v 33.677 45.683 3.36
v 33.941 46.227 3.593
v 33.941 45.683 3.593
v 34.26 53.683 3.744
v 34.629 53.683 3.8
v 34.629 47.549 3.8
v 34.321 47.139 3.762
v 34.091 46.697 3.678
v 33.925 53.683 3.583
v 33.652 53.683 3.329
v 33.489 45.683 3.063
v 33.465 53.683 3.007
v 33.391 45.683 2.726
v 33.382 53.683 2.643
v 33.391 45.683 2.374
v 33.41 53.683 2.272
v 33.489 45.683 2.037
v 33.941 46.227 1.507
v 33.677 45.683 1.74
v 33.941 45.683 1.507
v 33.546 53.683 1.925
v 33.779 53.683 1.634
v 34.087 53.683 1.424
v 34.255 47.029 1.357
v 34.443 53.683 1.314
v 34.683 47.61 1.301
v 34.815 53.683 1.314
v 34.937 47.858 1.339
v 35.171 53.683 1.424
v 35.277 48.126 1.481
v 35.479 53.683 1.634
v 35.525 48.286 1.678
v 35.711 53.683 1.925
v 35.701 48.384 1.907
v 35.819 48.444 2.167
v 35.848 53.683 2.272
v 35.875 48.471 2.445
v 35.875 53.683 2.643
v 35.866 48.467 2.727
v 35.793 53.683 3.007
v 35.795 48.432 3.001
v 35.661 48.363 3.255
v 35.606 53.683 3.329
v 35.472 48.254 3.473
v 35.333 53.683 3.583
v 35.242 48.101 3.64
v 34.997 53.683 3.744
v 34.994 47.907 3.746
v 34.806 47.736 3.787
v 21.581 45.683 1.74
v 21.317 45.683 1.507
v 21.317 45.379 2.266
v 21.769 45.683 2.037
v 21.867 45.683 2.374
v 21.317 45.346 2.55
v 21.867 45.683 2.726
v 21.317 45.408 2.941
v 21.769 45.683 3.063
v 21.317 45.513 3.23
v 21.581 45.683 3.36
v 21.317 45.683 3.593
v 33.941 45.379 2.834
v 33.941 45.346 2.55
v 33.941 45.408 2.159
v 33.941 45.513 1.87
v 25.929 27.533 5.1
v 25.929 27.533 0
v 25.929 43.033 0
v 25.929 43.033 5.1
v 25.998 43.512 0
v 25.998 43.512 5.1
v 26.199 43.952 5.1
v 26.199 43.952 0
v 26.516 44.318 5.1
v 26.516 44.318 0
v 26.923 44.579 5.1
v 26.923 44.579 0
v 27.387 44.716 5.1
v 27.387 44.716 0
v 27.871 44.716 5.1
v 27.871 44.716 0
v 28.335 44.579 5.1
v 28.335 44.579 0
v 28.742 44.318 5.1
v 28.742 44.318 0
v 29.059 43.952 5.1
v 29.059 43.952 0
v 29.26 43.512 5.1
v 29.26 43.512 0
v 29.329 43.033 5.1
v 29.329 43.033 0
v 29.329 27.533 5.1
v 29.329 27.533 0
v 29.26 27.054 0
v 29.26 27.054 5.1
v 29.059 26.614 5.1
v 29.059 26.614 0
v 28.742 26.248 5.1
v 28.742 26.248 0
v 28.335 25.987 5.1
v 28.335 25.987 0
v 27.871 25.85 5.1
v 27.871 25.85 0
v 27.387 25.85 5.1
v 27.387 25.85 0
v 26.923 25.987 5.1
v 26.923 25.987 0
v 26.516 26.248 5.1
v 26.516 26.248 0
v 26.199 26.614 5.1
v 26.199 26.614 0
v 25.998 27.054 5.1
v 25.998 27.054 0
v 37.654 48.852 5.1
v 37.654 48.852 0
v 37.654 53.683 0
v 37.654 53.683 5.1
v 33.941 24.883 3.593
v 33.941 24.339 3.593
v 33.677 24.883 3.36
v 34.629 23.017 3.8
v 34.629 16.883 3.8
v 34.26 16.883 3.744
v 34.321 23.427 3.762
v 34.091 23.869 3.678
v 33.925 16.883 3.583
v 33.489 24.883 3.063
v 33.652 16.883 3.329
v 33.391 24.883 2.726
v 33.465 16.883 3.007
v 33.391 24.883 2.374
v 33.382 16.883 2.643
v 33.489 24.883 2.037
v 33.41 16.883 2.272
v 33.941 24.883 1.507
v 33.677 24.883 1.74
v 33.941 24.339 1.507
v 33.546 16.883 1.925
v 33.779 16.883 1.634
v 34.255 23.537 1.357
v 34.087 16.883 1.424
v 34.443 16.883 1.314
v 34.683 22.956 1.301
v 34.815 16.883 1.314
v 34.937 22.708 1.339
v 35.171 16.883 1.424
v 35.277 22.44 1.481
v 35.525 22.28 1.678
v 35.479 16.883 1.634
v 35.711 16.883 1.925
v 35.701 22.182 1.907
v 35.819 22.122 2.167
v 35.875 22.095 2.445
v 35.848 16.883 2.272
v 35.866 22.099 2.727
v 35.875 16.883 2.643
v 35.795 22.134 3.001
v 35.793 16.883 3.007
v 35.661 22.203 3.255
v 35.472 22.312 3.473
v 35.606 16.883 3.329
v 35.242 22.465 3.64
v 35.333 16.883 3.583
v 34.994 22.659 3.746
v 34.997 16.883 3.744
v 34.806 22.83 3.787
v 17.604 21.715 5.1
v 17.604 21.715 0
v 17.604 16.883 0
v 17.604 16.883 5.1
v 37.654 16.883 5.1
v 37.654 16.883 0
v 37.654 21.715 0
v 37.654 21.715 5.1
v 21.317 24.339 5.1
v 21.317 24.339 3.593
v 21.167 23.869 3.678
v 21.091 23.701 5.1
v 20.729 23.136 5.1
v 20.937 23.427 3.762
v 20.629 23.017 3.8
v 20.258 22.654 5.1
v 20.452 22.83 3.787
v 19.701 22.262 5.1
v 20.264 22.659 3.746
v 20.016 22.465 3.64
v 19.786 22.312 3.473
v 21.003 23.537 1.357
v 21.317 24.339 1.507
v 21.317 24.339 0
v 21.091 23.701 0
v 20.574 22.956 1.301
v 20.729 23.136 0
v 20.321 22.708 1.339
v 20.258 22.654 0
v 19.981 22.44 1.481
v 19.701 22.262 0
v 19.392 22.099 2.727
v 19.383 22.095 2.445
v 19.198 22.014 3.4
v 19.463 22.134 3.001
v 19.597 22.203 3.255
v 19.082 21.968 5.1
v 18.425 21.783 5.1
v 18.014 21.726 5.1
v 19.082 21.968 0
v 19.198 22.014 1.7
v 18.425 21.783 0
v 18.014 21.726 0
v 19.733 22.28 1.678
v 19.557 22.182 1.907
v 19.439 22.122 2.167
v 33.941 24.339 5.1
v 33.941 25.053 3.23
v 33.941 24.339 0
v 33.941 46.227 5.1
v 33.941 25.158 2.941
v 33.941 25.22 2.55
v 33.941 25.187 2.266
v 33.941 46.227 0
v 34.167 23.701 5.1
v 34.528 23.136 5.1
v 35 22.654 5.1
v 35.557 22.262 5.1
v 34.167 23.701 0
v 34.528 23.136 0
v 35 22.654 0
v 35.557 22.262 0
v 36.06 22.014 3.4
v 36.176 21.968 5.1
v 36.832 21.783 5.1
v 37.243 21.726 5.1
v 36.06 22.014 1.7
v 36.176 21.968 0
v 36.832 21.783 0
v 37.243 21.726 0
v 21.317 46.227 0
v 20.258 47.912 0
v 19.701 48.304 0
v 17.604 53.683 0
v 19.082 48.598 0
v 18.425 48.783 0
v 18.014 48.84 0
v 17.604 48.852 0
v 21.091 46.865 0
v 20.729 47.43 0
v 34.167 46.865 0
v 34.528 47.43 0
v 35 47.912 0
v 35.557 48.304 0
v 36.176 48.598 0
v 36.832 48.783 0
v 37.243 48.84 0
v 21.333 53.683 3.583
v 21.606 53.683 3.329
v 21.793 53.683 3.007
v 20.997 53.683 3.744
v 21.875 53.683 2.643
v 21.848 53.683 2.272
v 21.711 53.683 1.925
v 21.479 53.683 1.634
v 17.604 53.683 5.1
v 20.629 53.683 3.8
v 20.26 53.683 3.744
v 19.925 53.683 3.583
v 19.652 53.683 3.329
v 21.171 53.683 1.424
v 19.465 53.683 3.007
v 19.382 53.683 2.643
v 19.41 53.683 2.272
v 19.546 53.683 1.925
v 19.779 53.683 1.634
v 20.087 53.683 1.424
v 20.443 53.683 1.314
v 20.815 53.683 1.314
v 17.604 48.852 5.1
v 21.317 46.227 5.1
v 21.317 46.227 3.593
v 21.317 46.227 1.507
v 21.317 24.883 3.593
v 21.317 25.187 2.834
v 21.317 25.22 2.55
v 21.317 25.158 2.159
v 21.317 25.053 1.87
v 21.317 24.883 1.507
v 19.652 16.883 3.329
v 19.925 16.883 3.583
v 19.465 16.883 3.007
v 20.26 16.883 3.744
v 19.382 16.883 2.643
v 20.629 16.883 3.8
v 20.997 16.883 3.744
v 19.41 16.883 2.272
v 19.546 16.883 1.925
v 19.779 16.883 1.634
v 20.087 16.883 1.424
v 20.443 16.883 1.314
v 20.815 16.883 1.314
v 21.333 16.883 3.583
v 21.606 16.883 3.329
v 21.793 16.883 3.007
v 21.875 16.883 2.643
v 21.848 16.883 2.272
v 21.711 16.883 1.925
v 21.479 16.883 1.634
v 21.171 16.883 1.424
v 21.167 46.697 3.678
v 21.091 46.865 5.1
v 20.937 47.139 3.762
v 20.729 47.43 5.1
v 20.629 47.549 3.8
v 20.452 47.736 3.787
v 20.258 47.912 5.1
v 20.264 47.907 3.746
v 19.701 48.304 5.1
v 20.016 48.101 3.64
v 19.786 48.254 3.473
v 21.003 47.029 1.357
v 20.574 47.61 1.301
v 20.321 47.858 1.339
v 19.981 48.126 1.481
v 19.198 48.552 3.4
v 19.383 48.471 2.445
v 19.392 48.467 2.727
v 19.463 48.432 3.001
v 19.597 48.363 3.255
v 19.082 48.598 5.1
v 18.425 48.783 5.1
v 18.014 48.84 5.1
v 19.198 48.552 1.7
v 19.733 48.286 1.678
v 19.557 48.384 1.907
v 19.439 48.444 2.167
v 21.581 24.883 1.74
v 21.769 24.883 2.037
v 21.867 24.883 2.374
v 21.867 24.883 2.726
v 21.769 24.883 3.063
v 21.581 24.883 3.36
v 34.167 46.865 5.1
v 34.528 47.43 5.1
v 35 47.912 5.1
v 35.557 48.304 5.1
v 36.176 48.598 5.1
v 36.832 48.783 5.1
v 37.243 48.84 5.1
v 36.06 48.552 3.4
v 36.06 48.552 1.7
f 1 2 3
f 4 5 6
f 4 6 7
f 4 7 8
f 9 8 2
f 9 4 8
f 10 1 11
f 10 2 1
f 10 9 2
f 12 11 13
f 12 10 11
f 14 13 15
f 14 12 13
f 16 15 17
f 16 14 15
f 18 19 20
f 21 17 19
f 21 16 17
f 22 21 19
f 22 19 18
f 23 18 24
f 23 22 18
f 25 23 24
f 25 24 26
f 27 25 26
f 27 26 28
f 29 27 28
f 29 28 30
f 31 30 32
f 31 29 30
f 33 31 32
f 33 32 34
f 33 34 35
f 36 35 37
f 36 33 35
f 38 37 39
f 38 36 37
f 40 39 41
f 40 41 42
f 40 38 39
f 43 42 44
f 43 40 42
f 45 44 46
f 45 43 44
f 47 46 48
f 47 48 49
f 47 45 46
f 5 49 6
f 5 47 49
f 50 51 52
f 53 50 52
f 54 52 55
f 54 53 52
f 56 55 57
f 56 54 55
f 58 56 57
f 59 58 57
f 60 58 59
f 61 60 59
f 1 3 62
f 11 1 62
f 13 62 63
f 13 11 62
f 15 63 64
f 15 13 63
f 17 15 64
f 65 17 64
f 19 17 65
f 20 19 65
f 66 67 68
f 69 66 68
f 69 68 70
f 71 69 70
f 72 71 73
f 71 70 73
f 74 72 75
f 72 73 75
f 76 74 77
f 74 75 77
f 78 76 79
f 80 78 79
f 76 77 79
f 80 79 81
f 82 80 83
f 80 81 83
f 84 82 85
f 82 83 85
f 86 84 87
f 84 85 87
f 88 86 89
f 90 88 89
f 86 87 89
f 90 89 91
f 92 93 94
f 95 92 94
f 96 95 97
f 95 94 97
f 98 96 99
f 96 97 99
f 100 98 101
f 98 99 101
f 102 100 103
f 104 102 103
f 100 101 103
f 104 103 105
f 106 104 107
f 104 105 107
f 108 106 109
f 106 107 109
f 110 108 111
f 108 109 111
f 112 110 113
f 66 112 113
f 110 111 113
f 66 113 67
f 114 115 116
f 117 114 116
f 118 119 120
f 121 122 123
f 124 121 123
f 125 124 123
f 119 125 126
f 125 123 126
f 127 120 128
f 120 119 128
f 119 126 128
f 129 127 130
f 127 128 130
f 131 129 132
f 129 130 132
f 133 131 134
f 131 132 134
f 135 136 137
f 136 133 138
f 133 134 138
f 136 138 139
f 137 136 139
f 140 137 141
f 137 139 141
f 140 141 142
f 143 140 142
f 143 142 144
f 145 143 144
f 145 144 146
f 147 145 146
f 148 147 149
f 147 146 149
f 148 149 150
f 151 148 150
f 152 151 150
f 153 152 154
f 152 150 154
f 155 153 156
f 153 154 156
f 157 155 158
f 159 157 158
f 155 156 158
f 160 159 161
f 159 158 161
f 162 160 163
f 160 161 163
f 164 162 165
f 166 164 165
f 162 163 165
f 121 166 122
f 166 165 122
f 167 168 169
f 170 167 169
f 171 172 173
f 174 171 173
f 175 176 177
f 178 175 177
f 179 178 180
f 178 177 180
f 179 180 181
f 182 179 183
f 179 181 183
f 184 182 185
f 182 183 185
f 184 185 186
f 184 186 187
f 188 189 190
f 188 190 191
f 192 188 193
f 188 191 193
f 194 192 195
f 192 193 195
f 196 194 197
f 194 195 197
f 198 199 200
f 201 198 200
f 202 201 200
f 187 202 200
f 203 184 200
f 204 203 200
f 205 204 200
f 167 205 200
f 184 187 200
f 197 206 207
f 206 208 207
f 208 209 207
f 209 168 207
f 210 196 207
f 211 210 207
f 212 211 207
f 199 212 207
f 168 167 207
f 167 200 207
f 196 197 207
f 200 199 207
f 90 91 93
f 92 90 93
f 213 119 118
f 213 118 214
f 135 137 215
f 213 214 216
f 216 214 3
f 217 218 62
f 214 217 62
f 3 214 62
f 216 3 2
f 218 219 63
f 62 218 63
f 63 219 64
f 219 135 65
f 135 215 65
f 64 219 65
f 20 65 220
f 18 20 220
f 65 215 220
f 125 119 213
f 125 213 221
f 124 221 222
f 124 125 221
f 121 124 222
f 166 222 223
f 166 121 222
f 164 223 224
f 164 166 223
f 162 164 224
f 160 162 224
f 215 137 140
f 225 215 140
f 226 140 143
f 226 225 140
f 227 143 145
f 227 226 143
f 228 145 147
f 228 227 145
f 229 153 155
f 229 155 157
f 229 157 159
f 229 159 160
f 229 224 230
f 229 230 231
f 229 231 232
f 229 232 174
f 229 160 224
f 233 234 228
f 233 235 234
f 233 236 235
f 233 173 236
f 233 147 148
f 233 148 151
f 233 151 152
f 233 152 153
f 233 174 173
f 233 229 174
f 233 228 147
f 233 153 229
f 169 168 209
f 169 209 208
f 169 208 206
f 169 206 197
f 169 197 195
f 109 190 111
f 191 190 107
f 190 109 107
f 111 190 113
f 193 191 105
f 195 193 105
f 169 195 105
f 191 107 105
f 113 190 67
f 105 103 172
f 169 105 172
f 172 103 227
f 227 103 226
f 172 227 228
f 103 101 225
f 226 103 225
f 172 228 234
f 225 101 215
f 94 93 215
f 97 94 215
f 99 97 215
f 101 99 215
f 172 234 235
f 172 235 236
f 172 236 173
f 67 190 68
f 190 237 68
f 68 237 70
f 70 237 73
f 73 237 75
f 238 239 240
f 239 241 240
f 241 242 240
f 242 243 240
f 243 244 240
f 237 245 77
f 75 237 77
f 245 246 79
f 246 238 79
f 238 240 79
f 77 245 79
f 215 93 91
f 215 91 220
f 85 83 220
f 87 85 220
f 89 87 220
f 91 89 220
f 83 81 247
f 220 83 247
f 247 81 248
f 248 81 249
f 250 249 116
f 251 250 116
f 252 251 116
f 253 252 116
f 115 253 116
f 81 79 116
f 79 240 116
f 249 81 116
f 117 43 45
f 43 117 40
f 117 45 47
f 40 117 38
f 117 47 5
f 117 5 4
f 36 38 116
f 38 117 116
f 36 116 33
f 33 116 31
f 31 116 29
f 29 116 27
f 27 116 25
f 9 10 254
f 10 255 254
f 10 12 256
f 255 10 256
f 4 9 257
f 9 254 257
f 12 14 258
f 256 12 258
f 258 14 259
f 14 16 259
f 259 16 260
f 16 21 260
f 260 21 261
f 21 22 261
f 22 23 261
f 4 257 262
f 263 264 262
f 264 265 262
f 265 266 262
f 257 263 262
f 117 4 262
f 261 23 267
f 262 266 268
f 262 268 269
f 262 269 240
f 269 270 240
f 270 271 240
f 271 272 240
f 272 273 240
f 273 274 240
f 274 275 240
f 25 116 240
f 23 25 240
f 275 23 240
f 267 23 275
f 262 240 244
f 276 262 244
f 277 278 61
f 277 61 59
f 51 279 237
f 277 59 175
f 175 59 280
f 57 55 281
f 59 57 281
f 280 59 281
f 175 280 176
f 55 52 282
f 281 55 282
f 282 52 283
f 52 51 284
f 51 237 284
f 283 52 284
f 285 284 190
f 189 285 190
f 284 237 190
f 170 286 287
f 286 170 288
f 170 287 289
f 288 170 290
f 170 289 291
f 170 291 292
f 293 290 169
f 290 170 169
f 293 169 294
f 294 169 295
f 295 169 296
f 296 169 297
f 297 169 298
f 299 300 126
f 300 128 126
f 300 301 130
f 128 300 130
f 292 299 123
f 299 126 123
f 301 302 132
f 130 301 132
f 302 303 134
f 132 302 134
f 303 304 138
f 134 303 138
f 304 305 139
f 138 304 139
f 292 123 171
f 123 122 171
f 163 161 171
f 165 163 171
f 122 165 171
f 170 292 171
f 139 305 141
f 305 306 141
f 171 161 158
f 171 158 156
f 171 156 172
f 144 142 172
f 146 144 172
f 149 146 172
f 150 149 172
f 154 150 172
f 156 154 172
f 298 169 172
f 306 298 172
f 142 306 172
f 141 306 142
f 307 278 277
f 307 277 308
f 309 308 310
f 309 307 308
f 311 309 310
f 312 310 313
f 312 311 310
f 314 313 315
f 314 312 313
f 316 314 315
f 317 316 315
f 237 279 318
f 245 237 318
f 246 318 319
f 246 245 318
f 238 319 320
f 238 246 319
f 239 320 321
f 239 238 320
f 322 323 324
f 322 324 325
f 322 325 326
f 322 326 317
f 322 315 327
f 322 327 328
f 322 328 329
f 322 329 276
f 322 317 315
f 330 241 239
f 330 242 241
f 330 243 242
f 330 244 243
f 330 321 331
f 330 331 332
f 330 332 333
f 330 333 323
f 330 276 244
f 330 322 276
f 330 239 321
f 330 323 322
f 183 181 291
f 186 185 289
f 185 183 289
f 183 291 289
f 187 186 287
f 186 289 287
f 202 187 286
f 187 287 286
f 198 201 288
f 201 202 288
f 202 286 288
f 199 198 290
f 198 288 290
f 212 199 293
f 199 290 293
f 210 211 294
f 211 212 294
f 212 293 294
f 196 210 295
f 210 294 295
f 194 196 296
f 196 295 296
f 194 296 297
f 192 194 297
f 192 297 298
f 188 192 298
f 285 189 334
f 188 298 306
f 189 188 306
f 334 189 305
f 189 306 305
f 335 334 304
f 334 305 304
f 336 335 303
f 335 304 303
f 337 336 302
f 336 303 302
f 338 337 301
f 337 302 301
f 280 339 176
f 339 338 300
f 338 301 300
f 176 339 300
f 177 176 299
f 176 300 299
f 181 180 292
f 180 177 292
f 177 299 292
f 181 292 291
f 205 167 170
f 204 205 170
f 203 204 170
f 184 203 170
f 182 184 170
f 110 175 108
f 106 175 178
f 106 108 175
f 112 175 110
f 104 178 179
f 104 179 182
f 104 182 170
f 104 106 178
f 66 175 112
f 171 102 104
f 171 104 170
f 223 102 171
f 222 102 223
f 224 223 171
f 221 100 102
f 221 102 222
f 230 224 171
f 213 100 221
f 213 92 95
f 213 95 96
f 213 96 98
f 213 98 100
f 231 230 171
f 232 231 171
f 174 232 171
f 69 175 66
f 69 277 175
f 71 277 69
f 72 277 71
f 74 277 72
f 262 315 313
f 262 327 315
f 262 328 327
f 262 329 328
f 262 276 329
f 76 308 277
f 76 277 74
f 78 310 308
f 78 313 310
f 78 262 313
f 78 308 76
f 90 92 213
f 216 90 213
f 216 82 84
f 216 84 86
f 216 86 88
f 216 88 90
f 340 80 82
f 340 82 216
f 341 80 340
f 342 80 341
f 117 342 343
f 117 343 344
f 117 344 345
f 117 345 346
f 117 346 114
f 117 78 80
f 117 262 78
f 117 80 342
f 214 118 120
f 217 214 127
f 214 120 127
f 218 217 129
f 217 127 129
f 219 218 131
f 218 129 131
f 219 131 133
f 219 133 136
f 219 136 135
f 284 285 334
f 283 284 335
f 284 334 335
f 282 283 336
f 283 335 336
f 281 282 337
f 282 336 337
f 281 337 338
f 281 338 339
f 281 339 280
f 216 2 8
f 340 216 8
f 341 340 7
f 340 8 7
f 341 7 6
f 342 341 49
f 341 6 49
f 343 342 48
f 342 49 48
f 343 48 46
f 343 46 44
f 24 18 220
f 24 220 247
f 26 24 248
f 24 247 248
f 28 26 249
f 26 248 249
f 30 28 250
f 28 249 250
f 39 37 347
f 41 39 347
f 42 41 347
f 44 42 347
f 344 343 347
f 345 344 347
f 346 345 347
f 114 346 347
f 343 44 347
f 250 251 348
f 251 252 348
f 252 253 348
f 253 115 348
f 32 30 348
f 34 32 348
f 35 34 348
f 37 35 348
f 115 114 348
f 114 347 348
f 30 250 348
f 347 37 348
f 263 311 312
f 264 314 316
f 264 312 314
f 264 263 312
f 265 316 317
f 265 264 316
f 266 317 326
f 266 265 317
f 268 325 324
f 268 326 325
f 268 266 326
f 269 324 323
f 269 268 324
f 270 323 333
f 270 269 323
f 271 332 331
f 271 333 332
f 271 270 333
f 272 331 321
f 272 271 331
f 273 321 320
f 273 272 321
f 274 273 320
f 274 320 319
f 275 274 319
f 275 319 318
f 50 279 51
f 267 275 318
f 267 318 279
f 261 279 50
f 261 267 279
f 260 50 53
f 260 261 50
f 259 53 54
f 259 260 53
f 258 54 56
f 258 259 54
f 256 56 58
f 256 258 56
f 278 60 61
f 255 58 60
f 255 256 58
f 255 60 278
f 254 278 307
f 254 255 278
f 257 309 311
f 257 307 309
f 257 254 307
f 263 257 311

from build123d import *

# Parameters (mm, degrees)
ESTRUSIONE_ESTRUSIONE1_DEPTH       = 5.1
FORO_FILETTATO_M3X0_5_1_AT_2_COUNT = 2
FORO_FILETTATO_M3X0_5_1_AT_2_PITCH = 14


with BuildPart() as part:
    # Schizzo1 → Estrusione-Estrusione1 (new body)
    with BuildSketch(Plane.XY):
        with BuildLine():
            Line((37.65394009, 53.683010839), (17.60394009, 53.683010839))
            Line((17.60394009, 53.683010839), (17.60394009, 48.851504979))
            add(Edge.make_bspline(
                [(21.317368868, 46.227364164), (20.952056874, 47.845897177), (19.207385128, 48.898989615), (17.60394009, 48.851504979)],
                knots=[0, 0, 0, 0, 1, 1, 1, 1], degree=3))
            Line((21.317368868, 46.227364164), (21.317368868, 24.338657514))
            add(Edge.make_bspline(
                [(21.317368868, 24.338657514), (20.952056874, 22.720124501), (19.207385128, 21.667032063), (17.60394009, 21.714516699)],
                knots=[0, 0, 0, 0, 1, 1, 1, 1], degree=3))
            Line((17.60394009, 21.714516699), (17.60394009, 16.883010839))
            Line((17.60394009, 16.883010839), (37.65394009, 16.883010839))
            Line((37.65394009, 16.883010839), (37.65394009, 21.714516699))
            add(Edge.make_bspline(
                [(33.940511311, 24.338657514), (34.305823306, 22.720124501), (36.050495052, 21.667032063), (37.65394009, 21.714516699)],
                knots=[0, 0, 0, 0, 1, 1, 1, 1], degree=3))
            Line((33.940511311, 24.338657514), (33.940511311, 46.227364164))
            add(Edge.make_bspline(
                [(33.940511311, 46.227364164), (34.305823306, 47.845897177), (36.050495052, 48.898989615), (37.65394009, 48.851504979)],
                knots=[0, 0, 0, 0, 1, 1, 1, 1], degree=3))
            Line((37.65394009, 48.851504979), (37.65394009, 53.683010839))
        make_face()
        with BuildLine():
            ThreePointArc((25.92894009, 43.033010839), (27.62894009, 44.733010839), (29.32894009, 43.033010839))
            Line((29.32894009, 43.033010839), (29.32894009, 27.533010839))
            ThreePointArc((29.32894009, 27.533010839), (27.62894009, 25.833010839), (25.92894009, 27.533010839))
            Line((25.92894009, 27.533010839), (25.92894009, 43.033010839))
        make_face(mode=Mode.SUBTRACT)
    extrude(amount=ESTRUSIONE_ESTRUSIONE1_DEPTH)

    # Schizzo2 → Foro filettato M3x0.5-1 (revolve, cut)
    with BuildSketch(Plane(origin=(20.62894009, 53.683010839, 2.55), x_dir=(0, 0, 1), z_dir=(1, 0, 0))):
        Polygon((0, 0), (0, 8.751075774), (1.25, 8), (1.25, 0), align=None)
    foro_filettato_m3x0_5_1 = revolve(axis=Axis((20.62894009, 60.033010839, 2.55), (0, -1, 0)), mode=Mode.SUBTRACT)

    # Foro filettato M3x0.5-1 at 2: Foro filettato M3x0.5-1 ×2
    with Locations(*[(i * FORO_FILETTATO_M3X0_5_1_AT_2_PITCH, 0, 0) for i in range(1, FORO_FILETTATO_M3X0_5_1_AT_2_COUNT)]):
        add(foro_filettato_m3x0_5_1, mode=Mode.SUBTRACT)

    # Specchia1: Foro filettato M3x0.5-1 across plane
    add(foro_filettato_m3x0_5_1.mirror(Plane.ZX.offset(35.283010839)), mode=Mode.SUBTRACT)

    # Specchia1 copy 1 sketch → Specchia1 copy 1 (revolve, cut)
    with BuildSketch(Plane(origin=(34.62894009, 16.883010839, 2.55), x_dir=(0, 0, 1), z_dir=(1, 0, 0))):
        Polygon((0, 0), (0, -8.751075774), (1.25, -8), (1.25, 0), align=None)
    revolve(axis=Axis((34.62894009, 10.533010839, 2.55), (0, -1, 0)), mode=Mode.SUBTRACT)


solid = part.part
